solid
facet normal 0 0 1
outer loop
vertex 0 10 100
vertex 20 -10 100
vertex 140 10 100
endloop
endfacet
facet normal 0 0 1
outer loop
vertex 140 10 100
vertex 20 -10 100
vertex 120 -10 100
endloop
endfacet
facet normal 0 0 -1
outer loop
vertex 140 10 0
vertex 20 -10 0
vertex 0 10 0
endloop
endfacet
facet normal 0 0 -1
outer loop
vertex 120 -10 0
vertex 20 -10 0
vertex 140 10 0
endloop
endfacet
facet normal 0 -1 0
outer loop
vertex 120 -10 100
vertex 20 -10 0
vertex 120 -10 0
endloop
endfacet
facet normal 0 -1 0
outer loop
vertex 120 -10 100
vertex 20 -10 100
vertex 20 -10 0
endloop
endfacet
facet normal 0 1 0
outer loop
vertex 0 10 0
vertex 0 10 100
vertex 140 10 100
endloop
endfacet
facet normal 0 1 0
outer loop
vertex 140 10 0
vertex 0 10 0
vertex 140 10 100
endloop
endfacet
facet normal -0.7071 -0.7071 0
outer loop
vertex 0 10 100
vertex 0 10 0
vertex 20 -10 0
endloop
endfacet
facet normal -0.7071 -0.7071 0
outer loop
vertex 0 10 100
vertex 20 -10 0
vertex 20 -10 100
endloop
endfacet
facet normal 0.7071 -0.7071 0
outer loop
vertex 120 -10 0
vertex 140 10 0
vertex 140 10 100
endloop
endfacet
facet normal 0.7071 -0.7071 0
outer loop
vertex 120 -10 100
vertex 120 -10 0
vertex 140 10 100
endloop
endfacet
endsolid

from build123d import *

# Parameters (mm, degrees)
F0_W     = 140
F0_H     = 100
F1_DEPTH = 10
F2_SIZE2 = 19.99999
F2_SIZE  = 19.99999
F3_SIZE2 = 19.99999
F3_SIZE  = 19.99999


# Not quite as in the source:
# - a fillet or chamfer is up to 0.001 mm smaller than in the source, because OpenCascade refuses the exact size


with BuildPart() as f1:
    # F0 (on Front) → F1 (new body, symmetric)
    with BuildSketch(Plane.XZ):
        with Locations((70, 50)):
            Rectangle(F0_W, F0_H)
    extrude(amount=F1_DEPTH, both=True)

    # F2 (size 20 and 20 in the source; OpenCascade refuses exactly that, so slightly less here)
    f2_edges = [f1.edges().sort_by_distance(p)[0] for p in [
        (140, -10, 50),
    ]]
    chamfer(f2_edges, length=F2_SIZE, length2=F2_SIZE2)

    # F3 (size 20 and 20 in the source; OpenCascade refuses exactly that, so slightly less here)
    f3_edges = [f1.edges().sort_by_distance(p)[0] for p in [
        (0, -10, 50),
    ]]
    chamfer(f3_edges, length=F3_SIZE, length2=F3_SIZE2)


solid = f1.part
